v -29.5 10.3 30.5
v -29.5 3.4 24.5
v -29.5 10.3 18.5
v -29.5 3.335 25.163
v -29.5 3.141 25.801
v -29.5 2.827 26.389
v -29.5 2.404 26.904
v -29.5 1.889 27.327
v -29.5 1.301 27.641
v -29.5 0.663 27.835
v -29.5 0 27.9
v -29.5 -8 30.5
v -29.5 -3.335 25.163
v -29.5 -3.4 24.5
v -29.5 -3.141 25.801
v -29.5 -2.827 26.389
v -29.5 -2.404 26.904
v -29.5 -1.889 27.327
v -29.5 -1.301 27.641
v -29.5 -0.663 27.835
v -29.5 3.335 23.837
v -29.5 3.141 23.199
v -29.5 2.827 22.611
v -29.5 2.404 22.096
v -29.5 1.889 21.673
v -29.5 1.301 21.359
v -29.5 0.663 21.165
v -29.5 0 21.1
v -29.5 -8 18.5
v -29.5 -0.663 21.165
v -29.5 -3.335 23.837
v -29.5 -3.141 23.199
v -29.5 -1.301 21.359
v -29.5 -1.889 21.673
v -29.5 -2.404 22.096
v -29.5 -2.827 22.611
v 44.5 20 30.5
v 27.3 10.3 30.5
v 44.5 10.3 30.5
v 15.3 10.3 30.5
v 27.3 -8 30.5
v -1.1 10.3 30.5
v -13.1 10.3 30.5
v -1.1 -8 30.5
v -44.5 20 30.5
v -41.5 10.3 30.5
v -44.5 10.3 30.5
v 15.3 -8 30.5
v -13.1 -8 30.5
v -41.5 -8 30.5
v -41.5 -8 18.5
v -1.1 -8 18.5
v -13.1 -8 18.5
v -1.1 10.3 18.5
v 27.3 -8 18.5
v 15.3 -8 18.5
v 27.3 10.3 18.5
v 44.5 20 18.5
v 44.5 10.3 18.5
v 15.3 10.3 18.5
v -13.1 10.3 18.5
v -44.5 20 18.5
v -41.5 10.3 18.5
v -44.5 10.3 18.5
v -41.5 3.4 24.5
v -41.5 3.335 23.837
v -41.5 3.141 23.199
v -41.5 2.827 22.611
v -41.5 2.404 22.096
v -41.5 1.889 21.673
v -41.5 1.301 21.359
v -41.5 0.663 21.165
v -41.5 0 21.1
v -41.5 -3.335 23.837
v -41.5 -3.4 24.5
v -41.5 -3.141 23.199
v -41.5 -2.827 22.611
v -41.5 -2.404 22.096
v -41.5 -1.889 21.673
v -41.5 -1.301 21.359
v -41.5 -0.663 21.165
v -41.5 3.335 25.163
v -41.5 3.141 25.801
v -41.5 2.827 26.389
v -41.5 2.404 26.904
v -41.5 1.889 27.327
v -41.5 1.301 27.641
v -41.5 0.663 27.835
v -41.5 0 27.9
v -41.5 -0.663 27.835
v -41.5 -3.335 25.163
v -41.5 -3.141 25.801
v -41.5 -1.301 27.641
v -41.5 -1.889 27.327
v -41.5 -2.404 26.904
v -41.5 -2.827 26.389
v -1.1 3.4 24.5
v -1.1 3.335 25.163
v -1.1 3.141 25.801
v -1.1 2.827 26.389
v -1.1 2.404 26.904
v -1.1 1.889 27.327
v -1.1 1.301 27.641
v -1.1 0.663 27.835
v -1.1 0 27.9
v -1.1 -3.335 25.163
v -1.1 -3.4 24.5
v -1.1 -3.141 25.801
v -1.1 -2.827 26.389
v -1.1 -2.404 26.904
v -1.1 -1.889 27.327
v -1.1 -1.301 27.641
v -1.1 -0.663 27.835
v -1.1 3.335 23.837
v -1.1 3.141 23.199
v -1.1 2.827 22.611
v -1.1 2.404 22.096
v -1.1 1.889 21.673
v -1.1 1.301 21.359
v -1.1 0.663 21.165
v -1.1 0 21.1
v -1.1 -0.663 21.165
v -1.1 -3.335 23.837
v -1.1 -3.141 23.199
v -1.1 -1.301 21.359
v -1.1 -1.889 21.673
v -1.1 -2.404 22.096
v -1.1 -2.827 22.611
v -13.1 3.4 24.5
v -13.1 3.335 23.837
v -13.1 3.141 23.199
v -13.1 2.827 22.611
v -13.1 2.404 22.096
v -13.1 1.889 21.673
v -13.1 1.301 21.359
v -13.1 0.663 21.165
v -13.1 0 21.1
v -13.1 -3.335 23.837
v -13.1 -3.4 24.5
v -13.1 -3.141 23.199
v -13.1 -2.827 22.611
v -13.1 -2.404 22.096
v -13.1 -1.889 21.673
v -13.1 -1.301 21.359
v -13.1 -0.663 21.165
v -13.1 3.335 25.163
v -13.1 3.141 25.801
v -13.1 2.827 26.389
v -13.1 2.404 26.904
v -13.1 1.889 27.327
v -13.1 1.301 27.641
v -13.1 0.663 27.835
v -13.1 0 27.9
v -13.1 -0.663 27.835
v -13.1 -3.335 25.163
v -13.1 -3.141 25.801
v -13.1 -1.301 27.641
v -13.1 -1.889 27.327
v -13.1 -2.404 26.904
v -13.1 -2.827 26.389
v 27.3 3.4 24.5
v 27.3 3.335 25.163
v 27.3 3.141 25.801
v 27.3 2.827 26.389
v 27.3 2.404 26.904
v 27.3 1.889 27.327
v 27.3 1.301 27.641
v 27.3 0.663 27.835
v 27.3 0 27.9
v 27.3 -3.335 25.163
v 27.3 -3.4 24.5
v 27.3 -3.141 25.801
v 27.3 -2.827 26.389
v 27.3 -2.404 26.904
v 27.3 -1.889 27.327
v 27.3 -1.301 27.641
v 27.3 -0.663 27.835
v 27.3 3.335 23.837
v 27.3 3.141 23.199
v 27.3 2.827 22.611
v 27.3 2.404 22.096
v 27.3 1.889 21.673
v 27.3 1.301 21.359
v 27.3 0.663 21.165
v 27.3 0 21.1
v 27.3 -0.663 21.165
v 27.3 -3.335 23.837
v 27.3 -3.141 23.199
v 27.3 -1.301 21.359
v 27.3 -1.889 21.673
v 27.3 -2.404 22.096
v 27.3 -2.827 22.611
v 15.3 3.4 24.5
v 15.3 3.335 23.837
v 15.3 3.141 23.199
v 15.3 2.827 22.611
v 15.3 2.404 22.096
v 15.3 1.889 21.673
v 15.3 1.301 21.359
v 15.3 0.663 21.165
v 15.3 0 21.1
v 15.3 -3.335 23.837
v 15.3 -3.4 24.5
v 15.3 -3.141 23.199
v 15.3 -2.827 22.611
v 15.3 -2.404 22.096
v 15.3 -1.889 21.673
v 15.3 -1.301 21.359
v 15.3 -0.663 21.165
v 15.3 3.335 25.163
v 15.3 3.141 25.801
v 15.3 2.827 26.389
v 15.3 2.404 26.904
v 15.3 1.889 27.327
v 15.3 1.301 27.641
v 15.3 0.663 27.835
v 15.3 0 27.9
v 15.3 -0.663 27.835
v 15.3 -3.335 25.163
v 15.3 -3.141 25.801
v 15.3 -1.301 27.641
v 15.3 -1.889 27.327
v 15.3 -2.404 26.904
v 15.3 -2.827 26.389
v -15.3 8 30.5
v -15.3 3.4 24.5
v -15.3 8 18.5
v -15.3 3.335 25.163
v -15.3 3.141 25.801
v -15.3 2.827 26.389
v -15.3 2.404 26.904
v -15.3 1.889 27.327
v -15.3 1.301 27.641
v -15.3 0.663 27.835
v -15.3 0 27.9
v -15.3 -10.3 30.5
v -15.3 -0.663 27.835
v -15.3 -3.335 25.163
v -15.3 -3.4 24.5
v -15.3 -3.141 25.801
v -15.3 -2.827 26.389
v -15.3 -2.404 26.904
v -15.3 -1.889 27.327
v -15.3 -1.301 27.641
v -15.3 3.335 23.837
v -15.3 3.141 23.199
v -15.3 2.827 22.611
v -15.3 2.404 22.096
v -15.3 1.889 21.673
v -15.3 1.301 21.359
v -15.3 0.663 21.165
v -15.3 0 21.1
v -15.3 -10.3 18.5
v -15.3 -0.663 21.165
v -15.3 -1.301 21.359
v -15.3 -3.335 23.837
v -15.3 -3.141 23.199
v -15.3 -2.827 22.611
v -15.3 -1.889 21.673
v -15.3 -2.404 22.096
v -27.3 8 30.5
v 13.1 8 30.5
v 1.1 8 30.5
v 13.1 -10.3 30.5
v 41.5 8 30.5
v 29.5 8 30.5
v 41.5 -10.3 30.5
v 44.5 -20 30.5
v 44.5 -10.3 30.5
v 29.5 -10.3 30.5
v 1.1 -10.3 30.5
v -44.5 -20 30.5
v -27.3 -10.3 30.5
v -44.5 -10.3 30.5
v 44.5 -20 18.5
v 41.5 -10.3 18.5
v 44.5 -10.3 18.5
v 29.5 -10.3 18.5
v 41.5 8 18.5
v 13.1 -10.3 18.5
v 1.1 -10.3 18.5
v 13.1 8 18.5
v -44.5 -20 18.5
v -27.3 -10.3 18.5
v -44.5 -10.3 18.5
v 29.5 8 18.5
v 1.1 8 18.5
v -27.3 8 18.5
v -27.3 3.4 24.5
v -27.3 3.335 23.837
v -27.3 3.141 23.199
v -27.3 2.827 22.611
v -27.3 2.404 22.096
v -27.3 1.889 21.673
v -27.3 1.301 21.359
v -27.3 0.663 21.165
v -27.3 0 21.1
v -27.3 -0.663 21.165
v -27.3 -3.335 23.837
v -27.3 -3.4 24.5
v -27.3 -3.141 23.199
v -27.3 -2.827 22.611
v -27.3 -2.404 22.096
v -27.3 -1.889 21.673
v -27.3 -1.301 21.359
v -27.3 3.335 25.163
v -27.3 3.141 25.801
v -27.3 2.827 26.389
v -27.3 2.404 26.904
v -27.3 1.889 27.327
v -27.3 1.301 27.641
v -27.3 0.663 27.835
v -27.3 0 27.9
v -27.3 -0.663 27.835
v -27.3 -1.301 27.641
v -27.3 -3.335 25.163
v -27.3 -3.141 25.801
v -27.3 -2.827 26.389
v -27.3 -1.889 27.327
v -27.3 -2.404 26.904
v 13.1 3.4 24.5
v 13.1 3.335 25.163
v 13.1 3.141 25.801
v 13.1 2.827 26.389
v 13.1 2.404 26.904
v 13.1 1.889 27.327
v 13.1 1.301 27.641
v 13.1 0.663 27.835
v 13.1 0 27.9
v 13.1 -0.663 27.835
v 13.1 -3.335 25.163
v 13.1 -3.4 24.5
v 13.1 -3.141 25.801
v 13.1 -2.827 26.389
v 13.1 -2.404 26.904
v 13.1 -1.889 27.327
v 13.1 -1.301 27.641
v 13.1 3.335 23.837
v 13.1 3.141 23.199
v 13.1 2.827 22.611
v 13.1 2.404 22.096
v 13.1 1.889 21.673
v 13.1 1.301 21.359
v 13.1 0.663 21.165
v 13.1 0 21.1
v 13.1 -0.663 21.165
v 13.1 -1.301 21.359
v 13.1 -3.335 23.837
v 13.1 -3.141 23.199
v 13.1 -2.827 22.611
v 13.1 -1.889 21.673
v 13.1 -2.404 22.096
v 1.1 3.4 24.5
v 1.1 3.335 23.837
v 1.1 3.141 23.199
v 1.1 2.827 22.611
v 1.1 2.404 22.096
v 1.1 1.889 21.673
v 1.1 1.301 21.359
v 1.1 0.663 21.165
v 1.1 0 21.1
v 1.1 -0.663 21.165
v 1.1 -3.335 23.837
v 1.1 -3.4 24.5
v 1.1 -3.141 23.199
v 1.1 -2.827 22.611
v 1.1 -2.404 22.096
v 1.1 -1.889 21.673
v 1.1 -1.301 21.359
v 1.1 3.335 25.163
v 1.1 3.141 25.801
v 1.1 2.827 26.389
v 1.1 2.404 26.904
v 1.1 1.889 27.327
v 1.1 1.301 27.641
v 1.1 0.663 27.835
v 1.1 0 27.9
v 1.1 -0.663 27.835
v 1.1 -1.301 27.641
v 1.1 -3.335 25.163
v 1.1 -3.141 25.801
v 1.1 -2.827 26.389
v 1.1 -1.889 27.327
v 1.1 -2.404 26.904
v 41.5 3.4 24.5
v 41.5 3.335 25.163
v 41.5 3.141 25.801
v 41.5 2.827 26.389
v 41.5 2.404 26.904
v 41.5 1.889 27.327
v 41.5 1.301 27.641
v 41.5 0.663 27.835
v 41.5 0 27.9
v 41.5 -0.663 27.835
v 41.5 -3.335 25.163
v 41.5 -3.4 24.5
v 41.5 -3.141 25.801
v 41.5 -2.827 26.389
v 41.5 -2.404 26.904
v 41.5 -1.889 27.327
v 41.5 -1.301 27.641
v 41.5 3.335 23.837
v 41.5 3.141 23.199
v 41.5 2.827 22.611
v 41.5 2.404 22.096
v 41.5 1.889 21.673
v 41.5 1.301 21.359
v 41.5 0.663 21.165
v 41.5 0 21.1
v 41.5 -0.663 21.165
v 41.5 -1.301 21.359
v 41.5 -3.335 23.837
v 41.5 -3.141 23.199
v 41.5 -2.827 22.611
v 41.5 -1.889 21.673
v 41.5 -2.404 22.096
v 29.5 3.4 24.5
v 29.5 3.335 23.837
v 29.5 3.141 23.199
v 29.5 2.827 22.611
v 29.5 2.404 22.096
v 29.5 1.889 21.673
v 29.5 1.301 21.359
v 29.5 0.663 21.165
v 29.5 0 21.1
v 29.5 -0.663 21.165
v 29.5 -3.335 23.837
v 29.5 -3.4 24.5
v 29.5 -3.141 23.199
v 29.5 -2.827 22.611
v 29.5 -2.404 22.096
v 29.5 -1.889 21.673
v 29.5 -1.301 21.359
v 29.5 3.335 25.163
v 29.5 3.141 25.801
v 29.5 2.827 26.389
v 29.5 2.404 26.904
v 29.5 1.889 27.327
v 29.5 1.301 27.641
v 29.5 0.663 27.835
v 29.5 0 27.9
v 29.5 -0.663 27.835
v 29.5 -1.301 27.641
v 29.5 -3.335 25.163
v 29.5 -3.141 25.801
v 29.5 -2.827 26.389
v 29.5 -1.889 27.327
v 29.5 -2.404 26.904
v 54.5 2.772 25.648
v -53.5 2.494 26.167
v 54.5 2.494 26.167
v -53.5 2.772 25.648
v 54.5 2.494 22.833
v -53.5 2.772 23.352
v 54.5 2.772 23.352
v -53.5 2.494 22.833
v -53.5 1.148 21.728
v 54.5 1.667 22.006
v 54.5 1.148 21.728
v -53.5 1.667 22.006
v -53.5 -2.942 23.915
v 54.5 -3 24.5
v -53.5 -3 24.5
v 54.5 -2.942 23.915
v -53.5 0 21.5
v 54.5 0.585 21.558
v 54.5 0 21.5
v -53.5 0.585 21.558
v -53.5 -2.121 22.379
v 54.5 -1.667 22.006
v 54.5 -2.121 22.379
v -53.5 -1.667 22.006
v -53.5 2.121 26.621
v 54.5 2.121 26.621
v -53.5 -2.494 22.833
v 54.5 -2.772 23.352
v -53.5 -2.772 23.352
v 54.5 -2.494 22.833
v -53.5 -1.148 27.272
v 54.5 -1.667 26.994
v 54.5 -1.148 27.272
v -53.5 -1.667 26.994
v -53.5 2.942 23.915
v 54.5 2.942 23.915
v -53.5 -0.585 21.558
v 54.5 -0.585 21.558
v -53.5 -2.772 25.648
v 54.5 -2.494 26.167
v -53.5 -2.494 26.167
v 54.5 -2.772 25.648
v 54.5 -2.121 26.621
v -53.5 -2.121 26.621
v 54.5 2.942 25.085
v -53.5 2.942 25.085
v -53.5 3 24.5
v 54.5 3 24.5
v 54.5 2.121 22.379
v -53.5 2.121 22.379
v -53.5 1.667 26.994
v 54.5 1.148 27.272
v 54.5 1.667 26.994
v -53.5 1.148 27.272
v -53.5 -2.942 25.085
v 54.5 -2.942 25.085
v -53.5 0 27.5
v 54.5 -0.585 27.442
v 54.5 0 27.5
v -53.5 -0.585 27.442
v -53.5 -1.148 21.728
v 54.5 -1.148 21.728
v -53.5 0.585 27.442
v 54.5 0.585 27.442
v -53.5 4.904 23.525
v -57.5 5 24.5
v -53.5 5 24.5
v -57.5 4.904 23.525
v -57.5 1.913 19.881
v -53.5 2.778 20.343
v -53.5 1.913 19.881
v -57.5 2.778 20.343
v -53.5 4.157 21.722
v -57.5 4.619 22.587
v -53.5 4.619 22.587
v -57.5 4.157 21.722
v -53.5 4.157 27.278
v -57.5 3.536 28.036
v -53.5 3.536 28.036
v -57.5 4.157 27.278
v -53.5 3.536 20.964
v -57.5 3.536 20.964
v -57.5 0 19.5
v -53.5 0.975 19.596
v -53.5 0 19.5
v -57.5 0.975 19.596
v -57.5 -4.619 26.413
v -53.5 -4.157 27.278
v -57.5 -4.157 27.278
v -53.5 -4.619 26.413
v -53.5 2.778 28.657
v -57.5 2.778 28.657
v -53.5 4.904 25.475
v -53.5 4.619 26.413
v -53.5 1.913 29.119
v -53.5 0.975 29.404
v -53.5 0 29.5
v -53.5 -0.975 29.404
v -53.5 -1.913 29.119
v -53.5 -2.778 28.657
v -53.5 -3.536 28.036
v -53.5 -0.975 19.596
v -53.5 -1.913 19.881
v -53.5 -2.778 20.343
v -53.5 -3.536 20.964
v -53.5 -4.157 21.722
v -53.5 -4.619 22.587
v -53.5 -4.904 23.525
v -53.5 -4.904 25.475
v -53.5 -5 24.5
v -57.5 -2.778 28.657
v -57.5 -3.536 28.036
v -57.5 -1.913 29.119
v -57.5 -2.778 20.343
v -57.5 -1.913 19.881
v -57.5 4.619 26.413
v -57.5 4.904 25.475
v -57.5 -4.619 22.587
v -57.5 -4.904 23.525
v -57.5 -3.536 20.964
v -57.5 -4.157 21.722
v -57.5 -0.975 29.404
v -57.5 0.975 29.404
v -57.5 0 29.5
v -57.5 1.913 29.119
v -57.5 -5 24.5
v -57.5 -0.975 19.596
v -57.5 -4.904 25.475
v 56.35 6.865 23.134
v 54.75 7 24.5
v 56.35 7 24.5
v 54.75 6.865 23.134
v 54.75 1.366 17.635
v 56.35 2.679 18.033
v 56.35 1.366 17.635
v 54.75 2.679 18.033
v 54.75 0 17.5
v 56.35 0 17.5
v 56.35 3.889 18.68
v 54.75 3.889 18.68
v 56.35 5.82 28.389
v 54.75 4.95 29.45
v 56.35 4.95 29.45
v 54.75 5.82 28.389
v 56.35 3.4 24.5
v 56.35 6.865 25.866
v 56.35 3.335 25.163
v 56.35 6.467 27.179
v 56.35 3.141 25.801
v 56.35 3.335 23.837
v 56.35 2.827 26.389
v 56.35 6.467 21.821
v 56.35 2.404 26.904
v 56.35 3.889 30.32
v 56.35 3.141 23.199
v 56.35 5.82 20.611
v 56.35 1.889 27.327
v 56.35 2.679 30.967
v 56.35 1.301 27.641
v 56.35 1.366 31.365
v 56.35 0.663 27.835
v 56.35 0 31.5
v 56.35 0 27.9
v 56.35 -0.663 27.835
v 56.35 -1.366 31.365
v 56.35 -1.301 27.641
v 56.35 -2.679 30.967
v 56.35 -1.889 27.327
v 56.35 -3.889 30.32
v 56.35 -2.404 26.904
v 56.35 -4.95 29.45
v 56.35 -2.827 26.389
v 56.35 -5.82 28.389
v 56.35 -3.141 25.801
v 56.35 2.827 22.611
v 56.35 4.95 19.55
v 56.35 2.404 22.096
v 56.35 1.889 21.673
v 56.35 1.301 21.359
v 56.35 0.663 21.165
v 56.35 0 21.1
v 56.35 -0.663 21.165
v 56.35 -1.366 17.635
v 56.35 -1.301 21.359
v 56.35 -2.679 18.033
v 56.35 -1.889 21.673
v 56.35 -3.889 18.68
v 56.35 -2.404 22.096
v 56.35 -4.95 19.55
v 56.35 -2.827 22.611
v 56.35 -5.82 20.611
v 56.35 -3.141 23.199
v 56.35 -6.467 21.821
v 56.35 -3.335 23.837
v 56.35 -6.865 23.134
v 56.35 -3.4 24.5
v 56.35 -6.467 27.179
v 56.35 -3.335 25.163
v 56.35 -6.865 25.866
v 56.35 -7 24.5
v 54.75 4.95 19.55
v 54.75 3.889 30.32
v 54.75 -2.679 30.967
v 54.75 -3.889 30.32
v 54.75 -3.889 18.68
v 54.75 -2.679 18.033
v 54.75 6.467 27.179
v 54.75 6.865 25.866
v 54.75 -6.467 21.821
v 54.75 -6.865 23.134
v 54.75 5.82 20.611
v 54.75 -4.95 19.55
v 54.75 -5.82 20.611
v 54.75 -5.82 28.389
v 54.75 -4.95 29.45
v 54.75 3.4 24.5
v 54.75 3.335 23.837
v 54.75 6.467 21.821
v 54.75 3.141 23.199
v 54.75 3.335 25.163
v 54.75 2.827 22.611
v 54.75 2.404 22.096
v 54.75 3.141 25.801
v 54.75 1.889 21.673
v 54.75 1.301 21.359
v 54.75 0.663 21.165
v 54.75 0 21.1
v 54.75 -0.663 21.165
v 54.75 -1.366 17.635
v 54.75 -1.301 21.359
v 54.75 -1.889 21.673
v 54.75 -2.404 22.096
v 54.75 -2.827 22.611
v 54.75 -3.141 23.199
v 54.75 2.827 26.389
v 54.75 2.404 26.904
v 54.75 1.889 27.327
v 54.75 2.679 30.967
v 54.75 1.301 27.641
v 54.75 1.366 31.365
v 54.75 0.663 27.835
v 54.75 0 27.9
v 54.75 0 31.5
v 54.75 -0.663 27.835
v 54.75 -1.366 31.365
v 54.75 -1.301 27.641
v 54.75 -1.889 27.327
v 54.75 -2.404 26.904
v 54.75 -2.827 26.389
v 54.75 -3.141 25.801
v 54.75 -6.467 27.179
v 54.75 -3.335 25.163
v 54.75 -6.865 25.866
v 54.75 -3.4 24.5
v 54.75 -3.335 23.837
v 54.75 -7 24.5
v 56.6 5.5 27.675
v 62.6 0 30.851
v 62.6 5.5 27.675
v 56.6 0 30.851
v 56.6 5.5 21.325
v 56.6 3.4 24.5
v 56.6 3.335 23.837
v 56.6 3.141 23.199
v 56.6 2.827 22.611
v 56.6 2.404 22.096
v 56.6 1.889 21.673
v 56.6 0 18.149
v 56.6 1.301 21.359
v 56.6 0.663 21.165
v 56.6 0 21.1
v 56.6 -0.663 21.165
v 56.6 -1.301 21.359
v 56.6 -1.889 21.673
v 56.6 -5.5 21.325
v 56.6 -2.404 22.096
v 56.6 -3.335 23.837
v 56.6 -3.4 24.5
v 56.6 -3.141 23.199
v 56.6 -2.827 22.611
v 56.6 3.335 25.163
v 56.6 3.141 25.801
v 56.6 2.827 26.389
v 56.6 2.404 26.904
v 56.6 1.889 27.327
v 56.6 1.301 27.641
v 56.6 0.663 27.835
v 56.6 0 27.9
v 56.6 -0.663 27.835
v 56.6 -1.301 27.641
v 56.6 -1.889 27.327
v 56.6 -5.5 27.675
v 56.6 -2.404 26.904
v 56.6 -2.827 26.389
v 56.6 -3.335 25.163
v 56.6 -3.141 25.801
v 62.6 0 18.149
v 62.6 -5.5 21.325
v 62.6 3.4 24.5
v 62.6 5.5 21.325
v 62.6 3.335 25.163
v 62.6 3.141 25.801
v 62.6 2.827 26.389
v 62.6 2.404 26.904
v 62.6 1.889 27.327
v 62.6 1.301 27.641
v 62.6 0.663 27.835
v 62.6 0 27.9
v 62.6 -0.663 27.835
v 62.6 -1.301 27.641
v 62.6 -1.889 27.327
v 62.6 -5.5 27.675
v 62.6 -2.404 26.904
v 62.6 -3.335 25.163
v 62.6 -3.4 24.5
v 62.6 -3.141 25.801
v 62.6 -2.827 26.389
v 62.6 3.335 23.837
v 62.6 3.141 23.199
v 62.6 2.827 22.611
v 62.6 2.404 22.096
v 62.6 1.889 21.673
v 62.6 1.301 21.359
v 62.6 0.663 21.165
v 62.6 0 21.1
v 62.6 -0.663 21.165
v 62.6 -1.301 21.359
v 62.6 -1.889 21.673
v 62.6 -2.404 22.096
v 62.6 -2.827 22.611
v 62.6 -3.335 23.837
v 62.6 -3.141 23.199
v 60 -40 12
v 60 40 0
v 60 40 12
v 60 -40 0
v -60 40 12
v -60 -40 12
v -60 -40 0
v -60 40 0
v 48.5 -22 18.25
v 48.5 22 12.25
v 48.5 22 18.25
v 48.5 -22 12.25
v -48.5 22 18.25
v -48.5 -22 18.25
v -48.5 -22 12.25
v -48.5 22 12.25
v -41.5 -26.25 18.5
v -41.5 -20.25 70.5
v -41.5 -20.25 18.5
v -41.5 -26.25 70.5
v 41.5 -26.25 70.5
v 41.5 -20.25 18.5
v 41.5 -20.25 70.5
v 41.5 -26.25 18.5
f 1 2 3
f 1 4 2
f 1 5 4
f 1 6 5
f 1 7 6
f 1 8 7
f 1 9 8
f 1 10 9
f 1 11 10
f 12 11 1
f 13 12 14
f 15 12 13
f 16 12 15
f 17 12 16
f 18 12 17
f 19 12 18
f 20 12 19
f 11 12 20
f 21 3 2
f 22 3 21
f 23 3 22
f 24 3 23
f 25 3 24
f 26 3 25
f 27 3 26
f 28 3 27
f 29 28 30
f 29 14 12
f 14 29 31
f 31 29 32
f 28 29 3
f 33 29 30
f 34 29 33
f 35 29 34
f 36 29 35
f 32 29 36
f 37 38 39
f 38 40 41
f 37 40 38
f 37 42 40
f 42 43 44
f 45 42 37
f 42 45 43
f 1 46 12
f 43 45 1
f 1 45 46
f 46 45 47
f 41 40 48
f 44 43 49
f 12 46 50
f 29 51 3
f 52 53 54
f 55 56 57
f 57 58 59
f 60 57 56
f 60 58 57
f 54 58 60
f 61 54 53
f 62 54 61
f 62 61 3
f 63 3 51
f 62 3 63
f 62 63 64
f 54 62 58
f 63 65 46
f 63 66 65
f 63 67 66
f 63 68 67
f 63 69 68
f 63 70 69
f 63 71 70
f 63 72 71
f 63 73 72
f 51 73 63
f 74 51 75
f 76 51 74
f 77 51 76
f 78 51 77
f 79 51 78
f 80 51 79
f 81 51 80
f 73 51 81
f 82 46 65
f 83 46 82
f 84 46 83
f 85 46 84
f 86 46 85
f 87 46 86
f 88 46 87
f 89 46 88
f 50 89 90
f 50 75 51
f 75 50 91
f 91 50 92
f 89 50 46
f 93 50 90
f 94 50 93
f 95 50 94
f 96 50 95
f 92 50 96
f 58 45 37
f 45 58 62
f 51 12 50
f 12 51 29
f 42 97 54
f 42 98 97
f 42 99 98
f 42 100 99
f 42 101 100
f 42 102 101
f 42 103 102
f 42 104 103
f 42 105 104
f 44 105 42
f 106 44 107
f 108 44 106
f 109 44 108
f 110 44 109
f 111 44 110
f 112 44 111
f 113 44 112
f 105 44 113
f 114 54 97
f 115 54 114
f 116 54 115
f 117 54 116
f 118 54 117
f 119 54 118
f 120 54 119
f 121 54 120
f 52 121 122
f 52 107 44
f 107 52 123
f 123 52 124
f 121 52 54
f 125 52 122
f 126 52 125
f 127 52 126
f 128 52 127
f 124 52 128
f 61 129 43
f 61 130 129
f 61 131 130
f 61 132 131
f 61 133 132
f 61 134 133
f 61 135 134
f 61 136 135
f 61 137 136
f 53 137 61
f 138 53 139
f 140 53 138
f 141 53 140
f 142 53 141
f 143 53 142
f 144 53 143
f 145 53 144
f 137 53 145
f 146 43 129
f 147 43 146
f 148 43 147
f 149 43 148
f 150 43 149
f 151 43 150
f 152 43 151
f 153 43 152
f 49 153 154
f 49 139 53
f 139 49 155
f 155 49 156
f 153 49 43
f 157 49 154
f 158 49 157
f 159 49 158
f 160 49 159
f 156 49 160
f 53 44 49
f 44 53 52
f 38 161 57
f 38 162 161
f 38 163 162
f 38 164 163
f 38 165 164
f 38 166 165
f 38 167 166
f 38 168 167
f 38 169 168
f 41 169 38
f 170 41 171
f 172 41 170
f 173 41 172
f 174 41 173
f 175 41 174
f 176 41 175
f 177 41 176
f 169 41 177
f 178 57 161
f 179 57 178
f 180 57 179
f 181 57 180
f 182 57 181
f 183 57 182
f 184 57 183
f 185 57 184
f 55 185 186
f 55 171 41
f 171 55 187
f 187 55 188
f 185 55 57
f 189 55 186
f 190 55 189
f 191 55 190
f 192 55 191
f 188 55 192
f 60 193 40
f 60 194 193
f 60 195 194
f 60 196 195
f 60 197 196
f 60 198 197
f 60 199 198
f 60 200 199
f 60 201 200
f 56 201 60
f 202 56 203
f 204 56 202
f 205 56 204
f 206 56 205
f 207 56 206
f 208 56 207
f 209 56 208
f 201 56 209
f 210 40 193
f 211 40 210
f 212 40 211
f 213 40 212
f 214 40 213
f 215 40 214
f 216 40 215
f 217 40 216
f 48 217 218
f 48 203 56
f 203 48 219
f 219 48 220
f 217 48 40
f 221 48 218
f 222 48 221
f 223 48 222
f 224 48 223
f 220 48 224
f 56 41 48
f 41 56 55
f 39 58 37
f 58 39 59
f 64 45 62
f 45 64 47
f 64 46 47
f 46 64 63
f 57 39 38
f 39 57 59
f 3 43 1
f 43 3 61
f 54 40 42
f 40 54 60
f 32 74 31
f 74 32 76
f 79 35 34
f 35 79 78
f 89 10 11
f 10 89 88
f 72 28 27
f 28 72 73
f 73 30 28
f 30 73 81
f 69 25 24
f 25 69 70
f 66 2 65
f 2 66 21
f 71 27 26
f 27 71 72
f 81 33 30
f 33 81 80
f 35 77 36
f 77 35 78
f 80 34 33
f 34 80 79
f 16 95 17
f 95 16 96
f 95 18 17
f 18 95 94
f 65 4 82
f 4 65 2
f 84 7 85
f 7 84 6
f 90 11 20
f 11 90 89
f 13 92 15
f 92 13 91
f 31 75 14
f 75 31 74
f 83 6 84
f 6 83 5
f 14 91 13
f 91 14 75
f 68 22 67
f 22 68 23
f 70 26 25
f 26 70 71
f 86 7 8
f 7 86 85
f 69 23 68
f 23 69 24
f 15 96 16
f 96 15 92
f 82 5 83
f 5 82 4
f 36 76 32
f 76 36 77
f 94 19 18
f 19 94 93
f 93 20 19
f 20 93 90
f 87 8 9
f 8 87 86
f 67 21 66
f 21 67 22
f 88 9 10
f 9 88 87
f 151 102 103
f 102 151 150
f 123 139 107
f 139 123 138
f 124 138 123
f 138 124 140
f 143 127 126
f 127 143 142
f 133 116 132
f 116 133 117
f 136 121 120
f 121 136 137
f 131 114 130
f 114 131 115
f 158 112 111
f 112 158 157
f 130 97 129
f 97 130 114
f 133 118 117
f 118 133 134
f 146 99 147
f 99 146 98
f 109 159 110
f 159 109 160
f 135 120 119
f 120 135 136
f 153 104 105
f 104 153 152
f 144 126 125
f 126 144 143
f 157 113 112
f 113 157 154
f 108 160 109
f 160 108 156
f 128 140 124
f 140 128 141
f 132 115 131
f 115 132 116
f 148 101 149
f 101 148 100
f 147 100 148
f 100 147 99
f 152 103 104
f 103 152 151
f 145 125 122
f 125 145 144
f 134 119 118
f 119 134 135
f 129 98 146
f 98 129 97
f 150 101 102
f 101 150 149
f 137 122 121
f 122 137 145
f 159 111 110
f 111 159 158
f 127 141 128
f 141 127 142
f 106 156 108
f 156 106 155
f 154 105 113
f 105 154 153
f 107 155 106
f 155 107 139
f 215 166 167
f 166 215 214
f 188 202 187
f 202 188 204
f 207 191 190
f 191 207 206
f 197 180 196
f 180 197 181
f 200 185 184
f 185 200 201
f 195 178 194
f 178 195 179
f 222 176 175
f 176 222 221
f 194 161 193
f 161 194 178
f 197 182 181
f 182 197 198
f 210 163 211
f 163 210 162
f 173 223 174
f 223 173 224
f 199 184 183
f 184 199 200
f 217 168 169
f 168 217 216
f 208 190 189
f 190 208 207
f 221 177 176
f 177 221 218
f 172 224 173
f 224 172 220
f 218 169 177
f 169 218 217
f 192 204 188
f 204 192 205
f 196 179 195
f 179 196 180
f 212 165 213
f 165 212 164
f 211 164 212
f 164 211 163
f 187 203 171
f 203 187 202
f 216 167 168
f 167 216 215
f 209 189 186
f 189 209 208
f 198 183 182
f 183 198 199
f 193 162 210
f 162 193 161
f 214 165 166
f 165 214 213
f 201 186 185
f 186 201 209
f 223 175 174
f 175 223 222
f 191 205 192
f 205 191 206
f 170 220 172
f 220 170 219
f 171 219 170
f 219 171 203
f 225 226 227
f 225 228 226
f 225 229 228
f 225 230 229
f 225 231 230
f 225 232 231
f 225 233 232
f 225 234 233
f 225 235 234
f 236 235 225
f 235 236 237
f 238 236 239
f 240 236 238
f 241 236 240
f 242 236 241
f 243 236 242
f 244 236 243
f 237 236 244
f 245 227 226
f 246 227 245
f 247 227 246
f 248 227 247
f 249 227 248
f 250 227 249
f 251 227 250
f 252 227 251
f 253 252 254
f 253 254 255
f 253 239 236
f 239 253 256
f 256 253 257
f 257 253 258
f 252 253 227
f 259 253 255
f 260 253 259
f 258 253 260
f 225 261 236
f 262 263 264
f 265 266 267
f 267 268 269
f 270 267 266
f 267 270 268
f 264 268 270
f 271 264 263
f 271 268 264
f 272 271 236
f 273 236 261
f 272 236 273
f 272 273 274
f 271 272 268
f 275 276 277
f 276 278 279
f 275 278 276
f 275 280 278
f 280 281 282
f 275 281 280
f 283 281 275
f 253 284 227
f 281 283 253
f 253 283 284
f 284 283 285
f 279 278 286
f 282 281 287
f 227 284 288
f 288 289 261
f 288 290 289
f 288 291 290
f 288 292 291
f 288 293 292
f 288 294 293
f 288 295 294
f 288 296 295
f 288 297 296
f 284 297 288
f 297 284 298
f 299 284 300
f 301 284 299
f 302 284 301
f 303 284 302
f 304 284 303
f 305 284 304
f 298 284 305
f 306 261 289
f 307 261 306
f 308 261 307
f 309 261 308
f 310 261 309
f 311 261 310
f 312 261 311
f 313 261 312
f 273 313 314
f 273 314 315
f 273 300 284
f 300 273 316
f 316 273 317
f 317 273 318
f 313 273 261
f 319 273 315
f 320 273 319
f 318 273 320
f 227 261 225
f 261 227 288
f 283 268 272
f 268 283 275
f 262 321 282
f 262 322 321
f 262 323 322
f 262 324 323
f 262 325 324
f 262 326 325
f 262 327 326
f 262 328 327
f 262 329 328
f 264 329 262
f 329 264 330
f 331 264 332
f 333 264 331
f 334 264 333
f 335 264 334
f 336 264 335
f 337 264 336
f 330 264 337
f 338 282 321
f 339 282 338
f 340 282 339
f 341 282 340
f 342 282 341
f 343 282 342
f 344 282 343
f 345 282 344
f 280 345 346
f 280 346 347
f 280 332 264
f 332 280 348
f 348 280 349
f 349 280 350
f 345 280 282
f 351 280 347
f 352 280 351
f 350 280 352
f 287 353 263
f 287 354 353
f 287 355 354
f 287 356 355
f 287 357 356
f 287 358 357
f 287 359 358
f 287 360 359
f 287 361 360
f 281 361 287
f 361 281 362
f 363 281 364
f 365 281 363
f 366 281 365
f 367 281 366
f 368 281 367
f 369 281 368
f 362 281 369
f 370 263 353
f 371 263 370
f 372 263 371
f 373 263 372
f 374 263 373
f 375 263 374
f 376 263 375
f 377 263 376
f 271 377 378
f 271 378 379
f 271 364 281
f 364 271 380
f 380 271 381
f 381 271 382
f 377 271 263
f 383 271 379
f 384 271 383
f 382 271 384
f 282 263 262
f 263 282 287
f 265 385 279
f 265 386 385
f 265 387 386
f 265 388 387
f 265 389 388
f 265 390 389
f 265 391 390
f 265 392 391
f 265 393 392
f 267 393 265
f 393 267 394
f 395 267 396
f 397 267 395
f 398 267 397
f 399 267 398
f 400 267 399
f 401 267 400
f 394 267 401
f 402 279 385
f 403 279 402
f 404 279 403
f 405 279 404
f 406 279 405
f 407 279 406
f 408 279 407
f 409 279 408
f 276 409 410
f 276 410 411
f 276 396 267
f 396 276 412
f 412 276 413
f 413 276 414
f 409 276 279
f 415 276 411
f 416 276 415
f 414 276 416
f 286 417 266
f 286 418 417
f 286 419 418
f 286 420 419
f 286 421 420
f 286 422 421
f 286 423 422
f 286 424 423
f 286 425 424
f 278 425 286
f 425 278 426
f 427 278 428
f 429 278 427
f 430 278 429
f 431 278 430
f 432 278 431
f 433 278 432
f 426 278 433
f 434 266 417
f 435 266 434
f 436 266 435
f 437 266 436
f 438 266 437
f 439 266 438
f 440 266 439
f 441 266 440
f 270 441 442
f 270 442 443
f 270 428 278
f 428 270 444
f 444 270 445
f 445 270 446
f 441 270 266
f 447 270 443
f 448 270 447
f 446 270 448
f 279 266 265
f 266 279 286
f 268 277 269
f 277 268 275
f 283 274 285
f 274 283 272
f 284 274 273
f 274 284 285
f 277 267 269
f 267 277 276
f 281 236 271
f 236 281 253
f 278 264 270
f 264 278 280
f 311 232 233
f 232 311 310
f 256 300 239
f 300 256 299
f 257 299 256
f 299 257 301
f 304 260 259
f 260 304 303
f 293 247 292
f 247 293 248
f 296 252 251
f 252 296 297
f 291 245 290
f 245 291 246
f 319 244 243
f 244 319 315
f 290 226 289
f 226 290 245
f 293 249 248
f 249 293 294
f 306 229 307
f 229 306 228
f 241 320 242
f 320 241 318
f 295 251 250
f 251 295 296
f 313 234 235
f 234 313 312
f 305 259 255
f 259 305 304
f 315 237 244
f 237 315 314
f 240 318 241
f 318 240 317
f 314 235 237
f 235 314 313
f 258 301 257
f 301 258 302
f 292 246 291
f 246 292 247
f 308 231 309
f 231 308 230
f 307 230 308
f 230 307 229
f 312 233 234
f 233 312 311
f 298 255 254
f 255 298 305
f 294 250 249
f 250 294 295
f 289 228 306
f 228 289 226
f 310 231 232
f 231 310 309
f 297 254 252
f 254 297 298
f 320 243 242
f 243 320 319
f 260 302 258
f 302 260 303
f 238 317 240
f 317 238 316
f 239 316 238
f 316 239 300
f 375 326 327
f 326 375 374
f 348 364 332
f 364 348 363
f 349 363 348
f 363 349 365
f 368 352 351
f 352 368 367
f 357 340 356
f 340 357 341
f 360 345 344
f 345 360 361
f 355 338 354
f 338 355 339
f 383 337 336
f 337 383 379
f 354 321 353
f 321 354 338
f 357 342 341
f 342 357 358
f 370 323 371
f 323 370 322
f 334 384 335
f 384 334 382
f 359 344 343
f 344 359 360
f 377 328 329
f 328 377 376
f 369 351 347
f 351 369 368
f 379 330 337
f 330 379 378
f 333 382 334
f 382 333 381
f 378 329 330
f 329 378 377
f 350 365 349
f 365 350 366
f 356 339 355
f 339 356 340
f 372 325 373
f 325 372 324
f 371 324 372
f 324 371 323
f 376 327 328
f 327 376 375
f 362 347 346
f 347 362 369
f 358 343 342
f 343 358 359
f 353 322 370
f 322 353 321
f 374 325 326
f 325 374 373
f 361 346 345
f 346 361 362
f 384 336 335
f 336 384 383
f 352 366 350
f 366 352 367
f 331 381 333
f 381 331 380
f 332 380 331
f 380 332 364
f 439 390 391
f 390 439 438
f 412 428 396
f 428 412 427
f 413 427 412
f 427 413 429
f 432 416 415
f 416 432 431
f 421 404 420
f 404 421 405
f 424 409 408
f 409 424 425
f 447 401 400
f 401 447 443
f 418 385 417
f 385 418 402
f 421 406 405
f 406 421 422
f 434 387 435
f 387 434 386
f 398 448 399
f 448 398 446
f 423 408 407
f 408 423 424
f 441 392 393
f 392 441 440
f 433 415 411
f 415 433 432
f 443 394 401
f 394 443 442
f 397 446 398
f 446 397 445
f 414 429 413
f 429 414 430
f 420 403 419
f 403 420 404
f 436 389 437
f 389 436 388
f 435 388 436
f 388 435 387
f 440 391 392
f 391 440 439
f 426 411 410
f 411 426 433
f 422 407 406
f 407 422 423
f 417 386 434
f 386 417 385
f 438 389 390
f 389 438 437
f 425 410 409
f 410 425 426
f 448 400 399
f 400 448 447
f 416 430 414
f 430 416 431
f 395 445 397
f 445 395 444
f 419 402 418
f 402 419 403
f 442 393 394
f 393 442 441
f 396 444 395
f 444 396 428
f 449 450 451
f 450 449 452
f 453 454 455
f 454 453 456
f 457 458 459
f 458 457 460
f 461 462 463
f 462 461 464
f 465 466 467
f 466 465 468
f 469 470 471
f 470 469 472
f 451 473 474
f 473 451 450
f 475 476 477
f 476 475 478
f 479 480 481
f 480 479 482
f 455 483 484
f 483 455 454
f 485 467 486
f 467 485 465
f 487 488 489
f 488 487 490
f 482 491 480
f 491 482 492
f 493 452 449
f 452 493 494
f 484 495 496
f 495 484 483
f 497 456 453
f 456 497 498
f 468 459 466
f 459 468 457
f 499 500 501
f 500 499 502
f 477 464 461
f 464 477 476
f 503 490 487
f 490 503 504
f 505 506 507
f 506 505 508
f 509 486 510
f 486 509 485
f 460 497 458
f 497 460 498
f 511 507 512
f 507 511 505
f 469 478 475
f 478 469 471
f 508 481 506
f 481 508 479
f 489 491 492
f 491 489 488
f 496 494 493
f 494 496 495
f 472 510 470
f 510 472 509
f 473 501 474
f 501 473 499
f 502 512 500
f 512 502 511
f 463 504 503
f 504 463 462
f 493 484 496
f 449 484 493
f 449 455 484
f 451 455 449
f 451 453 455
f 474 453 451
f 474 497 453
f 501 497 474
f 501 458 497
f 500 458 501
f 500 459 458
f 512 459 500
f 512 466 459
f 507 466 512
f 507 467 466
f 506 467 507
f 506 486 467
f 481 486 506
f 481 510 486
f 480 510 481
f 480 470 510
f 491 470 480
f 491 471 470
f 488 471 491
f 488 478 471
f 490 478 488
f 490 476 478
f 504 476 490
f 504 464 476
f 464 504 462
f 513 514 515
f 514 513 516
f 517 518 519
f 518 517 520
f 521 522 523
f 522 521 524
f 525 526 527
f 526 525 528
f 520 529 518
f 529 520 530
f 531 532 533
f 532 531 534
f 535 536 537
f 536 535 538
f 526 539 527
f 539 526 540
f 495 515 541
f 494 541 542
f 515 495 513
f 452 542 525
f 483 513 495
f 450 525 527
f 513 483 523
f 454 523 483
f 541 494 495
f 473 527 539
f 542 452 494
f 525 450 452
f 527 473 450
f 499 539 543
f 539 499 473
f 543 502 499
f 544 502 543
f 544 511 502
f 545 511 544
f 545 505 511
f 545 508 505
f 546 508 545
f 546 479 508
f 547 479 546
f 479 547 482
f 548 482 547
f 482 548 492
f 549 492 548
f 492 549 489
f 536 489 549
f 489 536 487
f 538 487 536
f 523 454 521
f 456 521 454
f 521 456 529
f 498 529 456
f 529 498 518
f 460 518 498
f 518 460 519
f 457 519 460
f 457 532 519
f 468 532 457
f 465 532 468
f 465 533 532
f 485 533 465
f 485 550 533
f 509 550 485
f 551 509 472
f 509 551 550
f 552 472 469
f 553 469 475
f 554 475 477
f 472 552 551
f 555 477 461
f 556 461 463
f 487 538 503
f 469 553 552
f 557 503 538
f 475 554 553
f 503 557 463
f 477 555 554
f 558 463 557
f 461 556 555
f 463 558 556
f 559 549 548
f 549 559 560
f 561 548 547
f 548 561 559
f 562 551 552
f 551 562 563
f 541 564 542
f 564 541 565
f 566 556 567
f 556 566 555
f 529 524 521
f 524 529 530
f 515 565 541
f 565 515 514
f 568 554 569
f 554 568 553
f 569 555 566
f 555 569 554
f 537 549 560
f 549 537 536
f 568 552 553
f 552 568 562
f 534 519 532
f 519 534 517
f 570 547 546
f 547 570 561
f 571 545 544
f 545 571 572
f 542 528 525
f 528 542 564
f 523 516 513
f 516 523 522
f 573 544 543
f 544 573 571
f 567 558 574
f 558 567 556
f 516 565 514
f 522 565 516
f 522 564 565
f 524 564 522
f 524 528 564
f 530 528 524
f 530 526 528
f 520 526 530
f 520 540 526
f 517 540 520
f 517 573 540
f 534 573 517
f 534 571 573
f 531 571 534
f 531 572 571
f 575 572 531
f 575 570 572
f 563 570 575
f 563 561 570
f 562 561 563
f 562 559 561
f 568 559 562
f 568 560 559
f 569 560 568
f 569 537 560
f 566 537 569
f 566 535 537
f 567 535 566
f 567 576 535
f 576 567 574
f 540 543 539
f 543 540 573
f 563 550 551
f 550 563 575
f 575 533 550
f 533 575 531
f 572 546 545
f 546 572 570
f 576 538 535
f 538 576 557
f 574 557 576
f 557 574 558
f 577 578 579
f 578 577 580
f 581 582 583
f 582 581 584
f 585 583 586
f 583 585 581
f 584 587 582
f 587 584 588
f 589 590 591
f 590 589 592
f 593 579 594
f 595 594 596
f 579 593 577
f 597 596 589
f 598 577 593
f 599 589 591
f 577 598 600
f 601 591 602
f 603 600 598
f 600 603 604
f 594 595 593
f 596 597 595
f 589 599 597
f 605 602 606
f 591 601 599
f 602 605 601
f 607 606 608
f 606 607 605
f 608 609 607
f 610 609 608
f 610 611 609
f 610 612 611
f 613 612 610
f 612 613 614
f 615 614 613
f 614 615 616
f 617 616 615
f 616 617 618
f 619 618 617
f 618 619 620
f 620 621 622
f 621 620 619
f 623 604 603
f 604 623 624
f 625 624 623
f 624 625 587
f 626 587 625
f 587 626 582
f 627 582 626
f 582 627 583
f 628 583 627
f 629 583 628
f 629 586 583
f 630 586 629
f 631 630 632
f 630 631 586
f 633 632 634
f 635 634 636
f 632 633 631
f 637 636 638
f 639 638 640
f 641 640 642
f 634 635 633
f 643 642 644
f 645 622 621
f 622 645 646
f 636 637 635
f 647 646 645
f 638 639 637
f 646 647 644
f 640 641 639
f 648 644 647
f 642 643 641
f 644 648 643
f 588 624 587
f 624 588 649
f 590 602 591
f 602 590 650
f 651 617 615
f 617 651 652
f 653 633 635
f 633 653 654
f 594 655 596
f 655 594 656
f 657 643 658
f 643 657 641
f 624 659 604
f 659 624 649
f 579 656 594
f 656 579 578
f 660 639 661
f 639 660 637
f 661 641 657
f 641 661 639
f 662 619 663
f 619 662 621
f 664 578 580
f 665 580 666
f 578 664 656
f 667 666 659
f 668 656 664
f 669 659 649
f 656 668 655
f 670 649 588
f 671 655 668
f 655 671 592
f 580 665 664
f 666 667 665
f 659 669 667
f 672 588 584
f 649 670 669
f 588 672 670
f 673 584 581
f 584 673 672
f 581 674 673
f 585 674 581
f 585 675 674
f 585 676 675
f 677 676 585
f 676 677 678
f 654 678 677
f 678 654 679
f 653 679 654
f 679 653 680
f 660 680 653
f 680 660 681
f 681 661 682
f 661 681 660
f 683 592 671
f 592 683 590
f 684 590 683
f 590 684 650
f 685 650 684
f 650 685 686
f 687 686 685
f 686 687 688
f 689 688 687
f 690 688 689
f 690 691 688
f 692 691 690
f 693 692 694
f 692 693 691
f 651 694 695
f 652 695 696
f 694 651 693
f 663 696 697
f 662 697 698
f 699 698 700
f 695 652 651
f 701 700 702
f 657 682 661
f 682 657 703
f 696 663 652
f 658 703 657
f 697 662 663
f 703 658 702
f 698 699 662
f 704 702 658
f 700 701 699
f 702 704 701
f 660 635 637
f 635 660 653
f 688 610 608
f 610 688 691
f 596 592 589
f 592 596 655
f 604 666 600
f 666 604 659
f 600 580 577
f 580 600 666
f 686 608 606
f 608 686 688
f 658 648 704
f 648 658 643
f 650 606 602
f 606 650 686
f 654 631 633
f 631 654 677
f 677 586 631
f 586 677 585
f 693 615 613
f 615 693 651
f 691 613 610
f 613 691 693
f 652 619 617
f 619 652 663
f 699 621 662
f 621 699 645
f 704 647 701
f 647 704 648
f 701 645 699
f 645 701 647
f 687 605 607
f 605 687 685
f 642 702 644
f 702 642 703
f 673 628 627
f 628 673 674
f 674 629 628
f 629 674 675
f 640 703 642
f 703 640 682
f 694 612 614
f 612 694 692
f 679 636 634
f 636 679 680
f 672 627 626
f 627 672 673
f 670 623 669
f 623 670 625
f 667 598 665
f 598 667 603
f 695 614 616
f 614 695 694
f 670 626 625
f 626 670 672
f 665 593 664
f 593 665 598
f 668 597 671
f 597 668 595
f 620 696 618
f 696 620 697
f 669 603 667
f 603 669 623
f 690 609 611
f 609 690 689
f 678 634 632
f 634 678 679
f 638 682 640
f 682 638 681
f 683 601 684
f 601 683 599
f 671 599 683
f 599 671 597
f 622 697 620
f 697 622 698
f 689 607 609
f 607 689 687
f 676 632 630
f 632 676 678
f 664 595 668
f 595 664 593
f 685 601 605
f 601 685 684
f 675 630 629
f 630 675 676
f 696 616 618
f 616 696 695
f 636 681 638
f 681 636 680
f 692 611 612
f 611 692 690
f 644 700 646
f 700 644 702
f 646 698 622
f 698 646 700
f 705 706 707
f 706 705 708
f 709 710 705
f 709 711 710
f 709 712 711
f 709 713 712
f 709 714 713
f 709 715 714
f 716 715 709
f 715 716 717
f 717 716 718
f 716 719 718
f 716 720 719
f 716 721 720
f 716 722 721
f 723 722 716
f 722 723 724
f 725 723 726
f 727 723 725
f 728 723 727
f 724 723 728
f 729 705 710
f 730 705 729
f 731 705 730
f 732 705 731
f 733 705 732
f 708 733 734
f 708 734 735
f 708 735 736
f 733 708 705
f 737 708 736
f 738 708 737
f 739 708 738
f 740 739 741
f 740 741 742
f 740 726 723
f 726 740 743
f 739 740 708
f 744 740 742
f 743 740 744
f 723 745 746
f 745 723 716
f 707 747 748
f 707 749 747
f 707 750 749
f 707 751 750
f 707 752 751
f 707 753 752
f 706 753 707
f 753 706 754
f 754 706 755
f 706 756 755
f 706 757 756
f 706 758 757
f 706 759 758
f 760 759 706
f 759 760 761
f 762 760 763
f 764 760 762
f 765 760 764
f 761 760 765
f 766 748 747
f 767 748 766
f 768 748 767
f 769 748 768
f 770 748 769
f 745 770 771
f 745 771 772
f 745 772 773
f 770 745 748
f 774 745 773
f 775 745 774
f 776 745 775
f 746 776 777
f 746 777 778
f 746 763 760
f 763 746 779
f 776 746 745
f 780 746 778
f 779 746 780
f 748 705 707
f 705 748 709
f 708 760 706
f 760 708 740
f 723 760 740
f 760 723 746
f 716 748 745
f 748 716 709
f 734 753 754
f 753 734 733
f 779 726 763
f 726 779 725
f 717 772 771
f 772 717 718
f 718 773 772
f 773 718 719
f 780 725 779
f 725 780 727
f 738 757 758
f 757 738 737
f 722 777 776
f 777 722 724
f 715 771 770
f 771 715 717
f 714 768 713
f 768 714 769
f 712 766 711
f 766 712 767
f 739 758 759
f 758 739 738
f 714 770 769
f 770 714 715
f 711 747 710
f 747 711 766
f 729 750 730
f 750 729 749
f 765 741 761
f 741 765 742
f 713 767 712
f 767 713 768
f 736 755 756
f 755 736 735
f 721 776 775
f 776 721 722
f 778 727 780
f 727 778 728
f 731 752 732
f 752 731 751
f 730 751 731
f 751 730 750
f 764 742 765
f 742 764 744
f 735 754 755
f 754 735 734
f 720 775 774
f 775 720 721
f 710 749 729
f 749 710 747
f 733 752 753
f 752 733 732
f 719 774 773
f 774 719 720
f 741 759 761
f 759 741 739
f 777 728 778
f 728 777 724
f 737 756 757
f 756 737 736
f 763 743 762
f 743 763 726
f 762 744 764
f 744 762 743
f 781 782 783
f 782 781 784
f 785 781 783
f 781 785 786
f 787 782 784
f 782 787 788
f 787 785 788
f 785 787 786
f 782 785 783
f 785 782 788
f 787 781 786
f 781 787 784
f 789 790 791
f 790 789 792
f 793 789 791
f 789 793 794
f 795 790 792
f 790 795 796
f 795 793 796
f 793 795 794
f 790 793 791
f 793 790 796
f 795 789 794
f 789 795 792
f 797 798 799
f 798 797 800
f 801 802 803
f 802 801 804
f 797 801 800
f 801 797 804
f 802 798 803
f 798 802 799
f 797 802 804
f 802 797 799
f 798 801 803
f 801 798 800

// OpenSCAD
$fn = 32;

// ------------------------------------------------------------------------
// Comb hinge with flap: leaf 89 x 20 mm, pin d6, flap 52 mm
// Every part is its own module, assembly() places every instance.
// ------------------------------------------------------------------------

// --- part 1 ---
module hinge_bed() {
  difference() {
    translate([-60, -40, 0]) cube([120, 80, 12]);
  }
}

// --- part 2 ---
module hinge_riser() {
  difference() {
    translate([-48.5, -22, 0]) cube([97, 44, 6]);
  }
}

// --- part 3 ---
module hinge_leaf_a() {
  difference() {
    union() {
      translate([-41.5, -8, -6]) cube([12, 28, 12]);
      translate([-13.1, -8, -6]) cube([12, 28, 12]);
      translate([15.3, -8, -6]) cube([12, 28, 12]);
      translate([-44.5, 10.3, -6]) cube([89, 9.7, 12]);
    }
    translate([-35.5, 0, 0]) rotate([0, 90, 0]) cylinder(h = 14, d = 6.8, center = true);
    translate([-7.1, 0, 0]) rotate([0, 90, 0]) cylinder(h = 14, d = 6.8, center = true);
    translate([21.3, 0, 0]) rotate([0, 90, 0]) cylinder(h = 14, d = 6.8, center = true);
  }
}

// --- part 4 ---
module hinge_leaf_b() {
  difference() {
    union() {
      translate([-27.3, -20, -6]) cube([12, 28, 12]);
      translate([1.1, -20, -6]) cube([12, 28, 12]);
      translate([29.5, -20, -6]) cube([12, 28, 12]);
      translate([-44.5, -20, -6]) cube([89, 9.7, 12]);
    }
    translate([-21.3, 0, 0]) rotate([0, 90, 0]) cylinder(h = 14, d = 6.8, center = true);
    translate([7.1, 0, 0]) rotate([0, 90, 0]) cylinder(h = 14, d = 6.8, center = true);
    translate([35.5, 0, 0]) rotate([0, 90, 0]) cylinder(h = 14, d = 6.8, center = true);
  }
}

// --- part 5 ---
module hinge_flap() {
  difference() {
    translate([-41.5, -26, 0]) cube([83, 52, 6]);
  }
}

// --- part 6 ---
module hinge_pin() {
  rotate([0, 90, 0]) cylinder(h = 109, d = 6, center = true);
  translate([-57.5, 0, 0]) rotate([0, 90, 0]) cylinder(h = 4, d = 10);
}

// --- part 7 ---
module pin_washer() {
  difference() {
      translate([0, 0, 0]) cylinder(h = 1.6, d = 14);
      translate([0, 0, -1]) cylinder(h = 3.6, d = 6.8);
    }
}

// --- part 8 ---
module pin_nut() {
  difference() {
    linear_extrude(height = 6) polygon(points = [[6.351, 0], [3.175, 5.5], [-3.175, 5.5], [-6.351, 0], [-3.175, -5.5], [3.175, -5.5]]);
    translate([0, 0, -1]) cylinder(h = 8, d = 6.8);
  }
}

// --- assembly ---
module assembly() {
  color([0.80, 0.24, 0.20]) translate([0, 0, 0]) rotate([0, 0, 0]) hinge_bed();
  color([0.20, 0.45, 0.75]) translate([0, 0, 12.25]) rotate([0, 0, 0]) hinge_riser();
  color([0.25, 0.62, 0.32]) translate([0, 0, 24.5]) rotate([0, 0, 0]) hinge_leaf_a();
  color([0.92, 0.70, 0.18]) translate([0, 0, 24.5]) rotate([0, 0, 0]) hinge_leaf_b();
  color([0.58, 0.35, 0.70]) translate([0, -20.25, 44.5]) rotate([90, 0, 0]) hinge_flap();
  color([0.16, 0.66, 0.66]) translate([0, 0, 24.5]) rotate([0, 0, 0]) hinge_pin();
  color([0.85, 0.48, 0.18]) translate([54.75, 0, 24.5]) rotate([0, 90, 0]) pin_washer();
  color([0.55, 0.60, 0.65]) translate([56.6, 0, 24.5]) rotate([0, 90, 0]) pin_nut();
}

assembly();
